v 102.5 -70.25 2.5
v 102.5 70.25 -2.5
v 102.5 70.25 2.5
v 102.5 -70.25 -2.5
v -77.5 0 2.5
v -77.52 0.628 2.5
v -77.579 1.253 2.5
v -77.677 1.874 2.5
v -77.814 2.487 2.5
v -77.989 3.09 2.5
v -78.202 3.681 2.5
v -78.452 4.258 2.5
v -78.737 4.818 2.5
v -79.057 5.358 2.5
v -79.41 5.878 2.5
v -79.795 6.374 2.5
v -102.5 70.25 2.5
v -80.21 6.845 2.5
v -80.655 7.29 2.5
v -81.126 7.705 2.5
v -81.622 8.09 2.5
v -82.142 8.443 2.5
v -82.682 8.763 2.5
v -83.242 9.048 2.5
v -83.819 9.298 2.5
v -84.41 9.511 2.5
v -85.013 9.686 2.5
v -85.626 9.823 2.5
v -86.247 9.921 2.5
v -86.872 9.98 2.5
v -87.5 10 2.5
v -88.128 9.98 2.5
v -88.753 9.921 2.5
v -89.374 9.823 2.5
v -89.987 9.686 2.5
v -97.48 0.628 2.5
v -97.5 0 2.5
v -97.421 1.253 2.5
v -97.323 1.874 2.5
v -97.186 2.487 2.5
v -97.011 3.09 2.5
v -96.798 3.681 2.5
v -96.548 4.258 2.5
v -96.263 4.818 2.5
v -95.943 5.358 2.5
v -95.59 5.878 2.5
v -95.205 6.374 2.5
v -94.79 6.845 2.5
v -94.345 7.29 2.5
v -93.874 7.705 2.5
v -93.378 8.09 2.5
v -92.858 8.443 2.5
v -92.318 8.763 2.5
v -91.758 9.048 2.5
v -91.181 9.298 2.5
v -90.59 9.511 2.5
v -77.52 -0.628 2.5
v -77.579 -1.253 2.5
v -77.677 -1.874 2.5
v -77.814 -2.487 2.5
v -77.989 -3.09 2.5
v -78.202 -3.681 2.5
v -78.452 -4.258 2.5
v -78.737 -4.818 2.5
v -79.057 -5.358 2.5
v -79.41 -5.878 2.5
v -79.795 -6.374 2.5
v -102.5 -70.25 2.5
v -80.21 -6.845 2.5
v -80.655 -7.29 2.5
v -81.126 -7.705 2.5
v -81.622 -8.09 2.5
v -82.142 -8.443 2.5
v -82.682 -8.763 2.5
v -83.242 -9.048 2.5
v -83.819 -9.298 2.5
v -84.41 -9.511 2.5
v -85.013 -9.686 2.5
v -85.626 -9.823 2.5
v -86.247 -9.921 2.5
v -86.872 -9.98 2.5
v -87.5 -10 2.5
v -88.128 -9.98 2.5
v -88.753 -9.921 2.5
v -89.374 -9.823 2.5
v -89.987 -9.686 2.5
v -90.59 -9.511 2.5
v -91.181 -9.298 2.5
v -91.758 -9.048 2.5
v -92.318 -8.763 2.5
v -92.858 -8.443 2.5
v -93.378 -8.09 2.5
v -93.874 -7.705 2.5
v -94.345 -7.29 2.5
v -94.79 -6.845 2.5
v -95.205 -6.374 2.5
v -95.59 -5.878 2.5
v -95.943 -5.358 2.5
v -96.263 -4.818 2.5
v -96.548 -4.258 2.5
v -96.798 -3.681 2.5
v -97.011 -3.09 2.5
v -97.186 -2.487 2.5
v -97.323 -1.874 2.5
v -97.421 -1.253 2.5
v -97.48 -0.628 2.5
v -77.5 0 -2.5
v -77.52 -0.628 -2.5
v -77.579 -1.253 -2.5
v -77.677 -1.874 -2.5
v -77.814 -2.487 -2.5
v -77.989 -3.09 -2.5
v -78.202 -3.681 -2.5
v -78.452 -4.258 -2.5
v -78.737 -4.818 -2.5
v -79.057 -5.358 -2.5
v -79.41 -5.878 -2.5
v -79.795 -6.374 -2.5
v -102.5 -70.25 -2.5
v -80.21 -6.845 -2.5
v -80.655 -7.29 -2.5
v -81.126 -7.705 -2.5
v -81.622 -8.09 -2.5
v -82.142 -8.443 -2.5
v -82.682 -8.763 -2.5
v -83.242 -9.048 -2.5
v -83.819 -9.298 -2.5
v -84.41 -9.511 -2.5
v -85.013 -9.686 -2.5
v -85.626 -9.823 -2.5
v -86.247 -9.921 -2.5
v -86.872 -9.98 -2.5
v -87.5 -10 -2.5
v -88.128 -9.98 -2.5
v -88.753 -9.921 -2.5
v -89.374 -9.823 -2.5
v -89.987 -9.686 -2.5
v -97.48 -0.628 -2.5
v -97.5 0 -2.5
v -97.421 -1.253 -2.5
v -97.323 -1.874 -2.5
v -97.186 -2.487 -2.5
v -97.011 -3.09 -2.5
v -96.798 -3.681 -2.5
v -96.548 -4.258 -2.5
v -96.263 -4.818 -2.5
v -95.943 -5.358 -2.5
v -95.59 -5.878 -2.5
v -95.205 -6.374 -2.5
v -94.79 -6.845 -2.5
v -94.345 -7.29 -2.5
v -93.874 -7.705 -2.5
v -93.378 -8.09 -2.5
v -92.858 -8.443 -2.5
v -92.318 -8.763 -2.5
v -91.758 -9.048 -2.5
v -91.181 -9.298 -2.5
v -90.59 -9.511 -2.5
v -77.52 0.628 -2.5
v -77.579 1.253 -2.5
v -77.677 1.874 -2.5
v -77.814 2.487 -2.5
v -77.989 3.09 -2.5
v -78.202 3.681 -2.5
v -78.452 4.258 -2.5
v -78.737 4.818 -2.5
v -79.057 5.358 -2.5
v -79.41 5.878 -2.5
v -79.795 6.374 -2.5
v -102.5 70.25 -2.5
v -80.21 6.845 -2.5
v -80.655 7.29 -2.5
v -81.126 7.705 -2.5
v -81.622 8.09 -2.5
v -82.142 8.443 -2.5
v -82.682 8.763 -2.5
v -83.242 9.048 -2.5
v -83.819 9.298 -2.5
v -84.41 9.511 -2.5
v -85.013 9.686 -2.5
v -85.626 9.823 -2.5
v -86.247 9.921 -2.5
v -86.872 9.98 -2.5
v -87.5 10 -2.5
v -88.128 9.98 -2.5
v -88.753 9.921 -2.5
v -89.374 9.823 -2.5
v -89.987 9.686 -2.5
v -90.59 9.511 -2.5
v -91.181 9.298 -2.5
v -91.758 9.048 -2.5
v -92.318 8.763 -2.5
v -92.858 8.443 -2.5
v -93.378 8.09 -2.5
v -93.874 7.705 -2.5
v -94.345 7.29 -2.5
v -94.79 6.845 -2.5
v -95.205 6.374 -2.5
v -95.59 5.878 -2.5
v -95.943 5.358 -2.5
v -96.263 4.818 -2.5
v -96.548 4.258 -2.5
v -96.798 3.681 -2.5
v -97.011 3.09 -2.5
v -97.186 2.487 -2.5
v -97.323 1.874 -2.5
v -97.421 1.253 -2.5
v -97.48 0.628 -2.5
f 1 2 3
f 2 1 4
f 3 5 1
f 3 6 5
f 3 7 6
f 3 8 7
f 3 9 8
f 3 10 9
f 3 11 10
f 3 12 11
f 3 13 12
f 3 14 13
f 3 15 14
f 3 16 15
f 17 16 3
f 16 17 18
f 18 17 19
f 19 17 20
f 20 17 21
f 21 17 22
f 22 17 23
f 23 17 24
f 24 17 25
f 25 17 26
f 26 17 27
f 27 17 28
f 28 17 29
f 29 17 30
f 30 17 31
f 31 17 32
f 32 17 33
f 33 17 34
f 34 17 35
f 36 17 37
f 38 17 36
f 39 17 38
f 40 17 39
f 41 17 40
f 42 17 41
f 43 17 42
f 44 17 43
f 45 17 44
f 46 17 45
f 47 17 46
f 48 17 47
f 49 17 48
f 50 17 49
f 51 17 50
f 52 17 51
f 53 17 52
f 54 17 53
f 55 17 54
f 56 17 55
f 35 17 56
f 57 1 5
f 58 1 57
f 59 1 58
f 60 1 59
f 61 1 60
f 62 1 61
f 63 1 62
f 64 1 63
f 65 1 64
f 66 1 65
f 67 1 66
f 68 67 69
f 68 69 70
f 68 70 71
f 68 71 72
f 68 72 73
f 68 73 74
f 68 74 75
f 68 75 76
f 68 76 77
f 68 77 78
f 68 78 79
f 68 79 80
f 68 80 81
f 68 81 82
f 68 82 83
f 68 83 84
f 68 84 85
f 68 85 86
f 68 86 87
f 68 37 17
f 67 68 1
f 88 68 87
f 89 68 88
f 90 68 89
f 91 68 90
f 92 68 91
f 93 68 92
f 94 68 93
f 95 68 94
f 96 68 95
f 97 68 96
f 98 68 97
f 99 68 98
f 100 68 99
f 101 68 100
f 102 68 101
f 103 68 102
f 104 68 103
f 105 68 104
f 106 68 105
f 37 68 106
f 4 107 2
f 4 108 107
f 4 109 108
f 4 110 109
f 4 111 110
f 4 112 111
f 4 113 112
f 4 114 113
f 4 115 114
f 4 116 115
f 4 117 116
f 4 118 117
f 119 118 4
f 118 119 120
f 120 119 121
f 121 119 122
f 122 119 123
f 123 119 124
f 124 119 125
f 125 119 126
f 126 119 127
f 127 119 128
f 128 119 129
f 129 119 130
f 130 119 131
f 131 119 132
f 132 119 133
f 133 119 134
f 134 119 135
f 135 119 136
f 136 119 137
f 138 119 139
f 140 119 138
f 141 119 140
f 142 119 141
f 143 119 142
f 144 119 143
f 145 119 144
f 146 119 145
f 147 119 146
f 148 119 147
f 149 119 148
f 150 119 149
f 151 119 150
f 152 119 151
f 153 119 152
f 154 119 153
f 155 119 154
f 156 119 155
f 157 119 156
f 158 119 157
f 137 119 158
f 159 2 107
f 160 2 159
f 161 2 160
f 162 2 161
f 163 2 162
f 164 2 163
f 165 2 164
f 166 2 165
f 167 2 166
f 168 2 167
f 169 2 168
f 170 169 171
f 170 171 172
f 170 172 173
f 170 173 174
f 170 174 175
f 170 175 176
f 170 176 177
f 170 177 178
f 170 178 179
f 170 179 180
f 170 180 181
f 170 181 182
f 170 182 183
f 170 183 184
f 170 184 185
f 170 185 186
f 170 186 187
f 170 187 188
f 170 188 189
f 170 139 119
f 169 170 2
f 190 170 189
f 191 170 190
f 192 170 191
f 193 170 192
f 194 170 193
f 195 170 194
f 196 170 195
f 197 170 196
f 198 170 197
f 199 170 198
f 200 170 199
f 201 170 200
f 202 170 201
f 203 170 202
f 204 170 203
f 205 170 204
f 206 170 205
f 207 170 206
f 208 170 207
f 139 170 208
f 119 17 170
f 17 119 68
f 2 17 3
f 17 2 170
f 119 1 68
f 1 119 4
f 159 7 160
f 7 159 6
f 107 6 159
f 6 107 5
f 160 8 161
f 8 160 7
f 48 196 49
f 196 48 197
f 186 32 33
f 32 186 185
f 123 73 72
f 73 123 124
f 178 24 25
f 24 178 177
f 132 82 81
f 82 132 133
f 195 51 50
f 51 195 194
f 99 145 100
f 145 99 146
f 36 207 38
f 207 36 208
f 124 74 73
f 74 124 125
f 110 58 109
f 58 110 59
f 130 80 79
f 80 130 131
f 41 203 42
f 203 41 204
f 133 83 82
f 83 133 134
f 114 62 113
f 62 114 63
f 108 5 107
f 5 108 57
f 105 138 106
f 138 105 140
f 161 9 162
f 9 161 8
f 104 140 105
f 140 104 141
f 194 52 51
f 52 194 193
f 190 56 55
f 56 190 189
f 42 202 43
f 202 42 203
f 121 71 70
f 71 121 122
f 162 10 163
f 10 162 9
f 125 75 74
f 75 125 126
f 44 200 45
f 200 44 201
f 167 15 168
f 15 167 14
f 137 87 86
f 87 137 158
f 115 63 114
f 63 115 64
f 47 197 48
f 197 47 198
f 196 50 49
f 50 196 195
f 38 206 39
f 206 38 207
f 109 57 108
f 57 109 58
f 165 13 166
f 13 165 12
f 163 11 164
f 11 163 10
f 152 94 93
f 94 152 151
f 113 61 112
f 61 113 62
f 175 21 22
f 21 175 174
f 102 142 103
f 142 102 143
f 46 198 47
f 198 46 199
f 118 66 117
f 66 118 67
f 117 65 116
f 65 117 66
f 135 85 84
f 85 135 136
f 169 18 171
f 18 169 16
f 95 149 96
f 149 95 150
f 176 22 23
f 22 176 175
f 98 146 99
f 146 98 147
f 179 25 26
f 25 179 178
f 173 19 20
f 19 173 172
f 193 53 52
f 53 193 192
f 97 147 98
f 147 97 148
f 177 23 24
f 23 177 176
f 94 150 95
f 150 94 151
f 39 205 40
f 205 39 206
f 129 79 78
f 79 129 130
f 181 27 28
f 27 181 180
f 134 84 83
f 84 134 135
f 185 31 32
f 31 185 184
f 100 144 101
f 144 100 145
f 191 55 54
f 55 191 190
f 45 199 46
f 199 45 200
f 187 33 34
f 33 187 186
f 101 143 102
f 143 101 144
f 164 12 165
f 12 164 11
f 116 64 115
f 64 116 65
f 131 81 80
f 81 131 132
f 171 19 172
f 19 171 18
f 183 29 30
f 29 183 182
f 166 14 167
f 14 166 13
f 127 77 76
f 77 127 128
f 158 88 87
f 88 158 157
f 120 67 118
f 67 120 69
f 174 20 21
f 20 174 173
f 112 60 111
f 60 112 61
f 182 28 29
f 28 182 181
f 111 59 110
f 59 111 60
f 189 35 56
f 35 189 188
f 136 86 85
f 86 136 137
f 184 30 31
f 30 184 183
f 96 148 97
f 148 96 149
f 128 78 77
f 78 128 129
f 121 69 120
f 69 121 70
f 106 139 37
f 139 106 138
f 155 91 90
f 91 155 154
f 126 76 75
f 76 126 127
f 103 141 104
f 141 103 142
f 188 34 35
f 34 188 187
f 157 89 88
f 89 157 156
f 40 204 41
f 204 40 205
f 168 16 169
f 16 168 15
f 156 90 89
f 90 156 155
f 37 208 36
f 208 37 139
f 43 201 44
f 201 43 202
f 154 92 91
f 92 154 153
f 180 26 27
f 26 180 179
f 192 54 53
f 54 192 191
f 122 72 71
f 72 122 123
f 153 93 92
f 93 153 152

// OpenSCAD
// file: myTools.scad
module tube (r = 0, d = 0, l = 0, 
            thick = 0, 
            bCentered = true, 
            taper_pct = 0, 
            circlip = false) // r=radius d=dia l=length 
{
    assert( r != 0 || d != 0, "specify one of radius or diameter");
    assert( l != 0 , "tube: need length 'l' to be non zero");
    assert( thick != 0, "wall thickness cannot be zero");

    punch = $preview ? .2 : 0; // stop funny view artifact

    dia = r ? r * 2 : d;

    od = ((thick > 0) ? dia + thick * 2 : dia);
    id = (thick > 0) ? dia             : dia  + thick *2; 

    
    
    if (thick > 0)
        echo ("tube\tMIN id = ", id, "od = ", od, "wall = ", thick, "center= ", bCentered);
    else
        echo ("tube\tMAX od = ", od, "id = ", id, "wall = ", thick, "center= ", bCentered);

    echo ("tube\tHeigth = ", l);
        
    if (taper_pct != 0)
    {
        echo ("tube\t*** OD expanded by ", taper_pct, "%, : bottom od = ", od * (1. +taper_pct/100), "top od = ", od);
    }
    
    assert(dia || dia < 0, "tube : missing r or d ");
    
    // if taper_pct specified, the base will always be closest to 0,0,0
    translate([ 0, 0, taper_pct == 0 ? 0: bCentered ? l/2:l  ])
    rotate([0, taper_pct == 0 ? 0 : 180, 0 ])

    difference()
    {
        // make a reese's cup
        {
            color("YELLOW", .3)
            linear_extrude(height= l, scale = 1 + taper_pct/100)
                difference()
                {
                    circle(d = od);
                    circle(d = .5);
                }
        }
    
     // hollow out reessed cup
     color("GREEN")
     translate([0, 0, -punch/2])
     linear_extrude(height= l+ punch*2, $fn=100)
     {
        circle(d = id);
        if (circlip) #square([1 + punch, od ]);
     }
    
    }
}
//==============================================================================
        
module abox (dims, 
            thick = 0, 
            bCentered = true, 
            round_out = 0, 
            round_in = 0, 
            bSolid = false,
            bHollow = false,
            elevator = 0)   // move bottom up by X
{
    punch = $preview ? .1 : 0; // stop funny view artifact
    
    assert(thick != 0, "Thick must be specified. +=outside dim, -= inside dims");
    assert(dims.z > thick, "wall thickness too large for depth of box");

    wall2 = abs(thick) * 2; // 2 walls in each direction
    wall = wall2 / 2;
    
    // box either grows inward (thick < 0) or outward (thick > 0)  from dims
    fat = dims + [ wall2, wall2, wall];
    thin = dims - [ wall2, wall2, wall];
    
    offset = (thick > 0 && bCentered == false) ? wall : 0;
    
    //echo ("abox : adjusting x,y,z by ", offset, " to move origin from  center to 0,0,0");
    translate( [ bCentered ? 0 : dims.x /2 + offset, bCentered ? 0 : dims.y /2 + offset, bCentered ? 0 : dims.z /2 + offset/2]) 
    {
        if (thick > 0)
        {   
            // wall grows outwards from users dim
            echo ("making a box, MAX INSIDE dim = ", dims);
            echo ("   wall=", thick, " mm");
            echo ("   calc outside = ", fat, " mm");
        }
        else
        {
            // wall grows inward from users dime
            echo ("making a box, MAX OUTSIDE dim = ", dims);
            echo ("    wall=", thick, "mm");
            echo ("    calc inside = ", thin, " mm");
        }
        echo (" ");
        
        // linear extrude alway works in the positive x/y plane an goes upward.
        // after calc, re-center about 0,0,0 where a bCentered cube would be
        
        translate([ 0, 0, thick > 0  ? -fat.z/2 : -dims.z/2 ])
        difference()
        {
            echo ("round_out = ", round_out);

            // MAKE SOLID BOX --------------------------------------
            router_outside = round_out ? round_out : 0;
            x = thick > 0  ? fat.x - router_outside : dims.x - router_outside;
            y = thick > 0  ? fat.y - router_outside : dims.y - router_outside;


            // MAKE PUCHNED INSIDE
            // using 'offset' it will add r on all dimensions, then round., 
            // so now you have fatter perimeter than you started with :(
            //  but at least the corners are round.
            
            // Compensate by shrinking dimension by r, 
            // and then by calling offset, offset will then add it back

            //color("YELLOW", .2)

            // ready height 
            linear_extrude(thick > 0  ? fat.z : dims.z)
            if (round_out)
            {
                offset( r= round_out, $fn=30)
                square( [x - router_outside, y - router_outside], true);
            }
            else
            {
                // no rounding on outside dims.
                square( [x, y], true);
            }
            // time to punch out the inside if requested.
            if (bSolid == false)
            {
                hollow_offset = bHollow ? fat.z/2 + .2  : dims.z/2 +.2;
                // punching out inside. its either dims or thin.
                router_inside = round_in;
                echo ("round_in = ", router_inside);
                xi = thick > 0  ? dims.x  : thin.x;
                yi = thick > 0  ? dims.y : thin.y ;

                color("GREEN")

                // move 'punch' up if you need a bottom else zero (hollowed out)

                translate([ 0,0, bHollow ? -.1 : wall + elevator]) 
                linear_extrude(thick > 0  ? fat.z - wall  + hollow_offset : dims.z - wall + hollow_offset)
                //#linear_extrude(fat.z - wall  + hollow_offset)
                
                if (round_in) 
                {
                    offset( r= round_in, $fn=30)
                    square( [ xi - round_in*2, yi - round_in*2], true);
                }
                else
                    square( [ xi, yi], true);
            }
        }
    }
 }
//-----------------------------------------------------
module abox_punch (dims, 
            thick = 0, 
            bCentered = true, 
            round_out = 0, 
            round_in = 0, 
            bSolid = false,
            bHollow = false,
            elevator = 0)   // move bottom up by X
{
    // move bottom down by wall thickness to blow out bottom
    abox(dims, thick, bCentered,
         round_out, round_in, bSolid = false, 
         bHollow=true, elevator = -thick);
}



// 50x25x10 box walls grow inward (-2). on center origin midpoint
// rounded outside (default), sharp corner inside(default), bCentered about 0,0,0
//color("GREEN", .9)
//abox([50,25, 10], -2, true); 


// 50x25x10 box walls grow outward (+2). on center origin midpoint
// sharp outside corners, rounded inside corners. Sit on x,y plane
color("BLUE", .9)
abox([50,20, 10], +2, round_in=2, bCentered = false);  // 50x25x10 box inside dim origin has 0,0


// 50x25x10 box walls grow inward (-2). on center origin midpoint
// sharp corners inside and out. sits on x,y plane
color("GREY", .9)//
translate([ 55, 0, 0])      
abox([50,20, 10], +2, round_out=3, false);

color("PINK", .9)//
translate([ 55 * 2, 0, 0])      
abox_punch([50,20, 10], +2, round_out=3, false);

color("GREEN", .9)//
translate([ 55 * 3, 0, 0])      
abox_punch([50,20, 10], +2, round_in=2, false);


color("CYAN", .9)//
translate([ 55 * 4, 0, 0])      
abox_punch([50,20, 10], +2, round_in=2, round_out=2, false);


/*
color("GREEN", .9)//
translate([ 140, 10, -10])      
abox([86.66, 56.865, 5], 3, bHollow = true, bCentered = false); 
*/

/*
// 50x25x10 box walls grow inward (-2). on center origin midpoint
// round corners outside and SOLID
color("BLUE", .9)//
translate([ 55, 0, 0])      
abox([50,25, 10], +2, round_out=2, round_in=0, false, bSolid = true); // 50x25x10 box outside dim origin is 0,0
*/

//translate ([-30,-30, 0])
{
/*
    // tube outer dia  20, inner dia = (20 - 8)
    color("PINK")
    tube (d = 20, l = 20, thick = -8, bCentered = false);

    // tube, inner dia = (2* 10), outer dia = ((2*10) + 2) 
    color("PURPLE", .3)
    tube (r = 10, l = 20, thick = +2, bCentered= true);
*/
/*
    tube (d = 60, l = 20, thick = -6, bCentered = false);

    translate([0, 0, 50])
    tube (d = 60, l = 20, thick = -6, bCentered = false, taper_pct = 20, circlip = true);
    //color("GREEN")
    //tube (d = 20, l = 20, thick = -2, bCentered = false, taper = 10, circlip = true);
*/

}
// main file
use <myTools.scad>
$fn=100;

OUTER_DIA =150;
THICK = 7;

BOX= OUTER_DIA + 40;
PIPE_HEIGHT = 40;

BOX_THICK = THICK *3;

SCREW_DIA = 3/16 * 25.4;

module scew_quad ()
{
    for ( x = [ -1: 1 ])
    {
        for ( y = [ -1: 1 ])
        {
            //if ( x && y )
            {
                xx = x * (BOX /2 - THICK *2);
                yy = y * (BOX/2 -THICK *2);
                echo ("xx ", xx, "yy =", yy);
                
                translate([ -xx, -yy,  -50 ]) 
                cylinder( d=SCREW_DIA, h = 100);
            }
        }
    }
}
bMakeBase=0;

if ( bMakeBase)
{
    difference()
    {
        color("RED", .7)
        union()
        {
            cube ([ BOX, BOX, BOX_THICK], center=true);

            color("GREEN", .5)
            translate([ 0, 0, (THICK + THICK/2)] )
            #cylinder( h = PIPE_HEIGHT, d=OUTER_DIA, center = false);
        }
     
        color("GREEN", .5)
        translate([ -THICK, 0, -THICK/4])
        cube ([ BOX , OUTER_DIA - THICK, THICK], center=true );

        color("BLACK", .3)
        translate([ 0, 0,  -THICK - THICK/2 -.1]) // +1 punch
        cylinder( h = PIPE_HEIGHT + 4 * THICK, d=OUTER_DIA - THICK*2, center = false);
        
        color("CYAN")
        scew_quad();
    }
}
else
{
    color("GREEN", .5)
    //translate([ -THICK, 0, -THICK/4])
    difference()
    {
        //cube ([ 235 , OUTER_DIA - THICK - 1.5, THICK-1], center=true );
        cube ([ 235 - 30 , OUTER_DIA - THICK - 2.5, THICK-2], center=true );
        translate([-250/2 + 25/2 + 10 + 15, 0, 0])
        #cylinder(h=20, d=20, center=true);
    }
}
